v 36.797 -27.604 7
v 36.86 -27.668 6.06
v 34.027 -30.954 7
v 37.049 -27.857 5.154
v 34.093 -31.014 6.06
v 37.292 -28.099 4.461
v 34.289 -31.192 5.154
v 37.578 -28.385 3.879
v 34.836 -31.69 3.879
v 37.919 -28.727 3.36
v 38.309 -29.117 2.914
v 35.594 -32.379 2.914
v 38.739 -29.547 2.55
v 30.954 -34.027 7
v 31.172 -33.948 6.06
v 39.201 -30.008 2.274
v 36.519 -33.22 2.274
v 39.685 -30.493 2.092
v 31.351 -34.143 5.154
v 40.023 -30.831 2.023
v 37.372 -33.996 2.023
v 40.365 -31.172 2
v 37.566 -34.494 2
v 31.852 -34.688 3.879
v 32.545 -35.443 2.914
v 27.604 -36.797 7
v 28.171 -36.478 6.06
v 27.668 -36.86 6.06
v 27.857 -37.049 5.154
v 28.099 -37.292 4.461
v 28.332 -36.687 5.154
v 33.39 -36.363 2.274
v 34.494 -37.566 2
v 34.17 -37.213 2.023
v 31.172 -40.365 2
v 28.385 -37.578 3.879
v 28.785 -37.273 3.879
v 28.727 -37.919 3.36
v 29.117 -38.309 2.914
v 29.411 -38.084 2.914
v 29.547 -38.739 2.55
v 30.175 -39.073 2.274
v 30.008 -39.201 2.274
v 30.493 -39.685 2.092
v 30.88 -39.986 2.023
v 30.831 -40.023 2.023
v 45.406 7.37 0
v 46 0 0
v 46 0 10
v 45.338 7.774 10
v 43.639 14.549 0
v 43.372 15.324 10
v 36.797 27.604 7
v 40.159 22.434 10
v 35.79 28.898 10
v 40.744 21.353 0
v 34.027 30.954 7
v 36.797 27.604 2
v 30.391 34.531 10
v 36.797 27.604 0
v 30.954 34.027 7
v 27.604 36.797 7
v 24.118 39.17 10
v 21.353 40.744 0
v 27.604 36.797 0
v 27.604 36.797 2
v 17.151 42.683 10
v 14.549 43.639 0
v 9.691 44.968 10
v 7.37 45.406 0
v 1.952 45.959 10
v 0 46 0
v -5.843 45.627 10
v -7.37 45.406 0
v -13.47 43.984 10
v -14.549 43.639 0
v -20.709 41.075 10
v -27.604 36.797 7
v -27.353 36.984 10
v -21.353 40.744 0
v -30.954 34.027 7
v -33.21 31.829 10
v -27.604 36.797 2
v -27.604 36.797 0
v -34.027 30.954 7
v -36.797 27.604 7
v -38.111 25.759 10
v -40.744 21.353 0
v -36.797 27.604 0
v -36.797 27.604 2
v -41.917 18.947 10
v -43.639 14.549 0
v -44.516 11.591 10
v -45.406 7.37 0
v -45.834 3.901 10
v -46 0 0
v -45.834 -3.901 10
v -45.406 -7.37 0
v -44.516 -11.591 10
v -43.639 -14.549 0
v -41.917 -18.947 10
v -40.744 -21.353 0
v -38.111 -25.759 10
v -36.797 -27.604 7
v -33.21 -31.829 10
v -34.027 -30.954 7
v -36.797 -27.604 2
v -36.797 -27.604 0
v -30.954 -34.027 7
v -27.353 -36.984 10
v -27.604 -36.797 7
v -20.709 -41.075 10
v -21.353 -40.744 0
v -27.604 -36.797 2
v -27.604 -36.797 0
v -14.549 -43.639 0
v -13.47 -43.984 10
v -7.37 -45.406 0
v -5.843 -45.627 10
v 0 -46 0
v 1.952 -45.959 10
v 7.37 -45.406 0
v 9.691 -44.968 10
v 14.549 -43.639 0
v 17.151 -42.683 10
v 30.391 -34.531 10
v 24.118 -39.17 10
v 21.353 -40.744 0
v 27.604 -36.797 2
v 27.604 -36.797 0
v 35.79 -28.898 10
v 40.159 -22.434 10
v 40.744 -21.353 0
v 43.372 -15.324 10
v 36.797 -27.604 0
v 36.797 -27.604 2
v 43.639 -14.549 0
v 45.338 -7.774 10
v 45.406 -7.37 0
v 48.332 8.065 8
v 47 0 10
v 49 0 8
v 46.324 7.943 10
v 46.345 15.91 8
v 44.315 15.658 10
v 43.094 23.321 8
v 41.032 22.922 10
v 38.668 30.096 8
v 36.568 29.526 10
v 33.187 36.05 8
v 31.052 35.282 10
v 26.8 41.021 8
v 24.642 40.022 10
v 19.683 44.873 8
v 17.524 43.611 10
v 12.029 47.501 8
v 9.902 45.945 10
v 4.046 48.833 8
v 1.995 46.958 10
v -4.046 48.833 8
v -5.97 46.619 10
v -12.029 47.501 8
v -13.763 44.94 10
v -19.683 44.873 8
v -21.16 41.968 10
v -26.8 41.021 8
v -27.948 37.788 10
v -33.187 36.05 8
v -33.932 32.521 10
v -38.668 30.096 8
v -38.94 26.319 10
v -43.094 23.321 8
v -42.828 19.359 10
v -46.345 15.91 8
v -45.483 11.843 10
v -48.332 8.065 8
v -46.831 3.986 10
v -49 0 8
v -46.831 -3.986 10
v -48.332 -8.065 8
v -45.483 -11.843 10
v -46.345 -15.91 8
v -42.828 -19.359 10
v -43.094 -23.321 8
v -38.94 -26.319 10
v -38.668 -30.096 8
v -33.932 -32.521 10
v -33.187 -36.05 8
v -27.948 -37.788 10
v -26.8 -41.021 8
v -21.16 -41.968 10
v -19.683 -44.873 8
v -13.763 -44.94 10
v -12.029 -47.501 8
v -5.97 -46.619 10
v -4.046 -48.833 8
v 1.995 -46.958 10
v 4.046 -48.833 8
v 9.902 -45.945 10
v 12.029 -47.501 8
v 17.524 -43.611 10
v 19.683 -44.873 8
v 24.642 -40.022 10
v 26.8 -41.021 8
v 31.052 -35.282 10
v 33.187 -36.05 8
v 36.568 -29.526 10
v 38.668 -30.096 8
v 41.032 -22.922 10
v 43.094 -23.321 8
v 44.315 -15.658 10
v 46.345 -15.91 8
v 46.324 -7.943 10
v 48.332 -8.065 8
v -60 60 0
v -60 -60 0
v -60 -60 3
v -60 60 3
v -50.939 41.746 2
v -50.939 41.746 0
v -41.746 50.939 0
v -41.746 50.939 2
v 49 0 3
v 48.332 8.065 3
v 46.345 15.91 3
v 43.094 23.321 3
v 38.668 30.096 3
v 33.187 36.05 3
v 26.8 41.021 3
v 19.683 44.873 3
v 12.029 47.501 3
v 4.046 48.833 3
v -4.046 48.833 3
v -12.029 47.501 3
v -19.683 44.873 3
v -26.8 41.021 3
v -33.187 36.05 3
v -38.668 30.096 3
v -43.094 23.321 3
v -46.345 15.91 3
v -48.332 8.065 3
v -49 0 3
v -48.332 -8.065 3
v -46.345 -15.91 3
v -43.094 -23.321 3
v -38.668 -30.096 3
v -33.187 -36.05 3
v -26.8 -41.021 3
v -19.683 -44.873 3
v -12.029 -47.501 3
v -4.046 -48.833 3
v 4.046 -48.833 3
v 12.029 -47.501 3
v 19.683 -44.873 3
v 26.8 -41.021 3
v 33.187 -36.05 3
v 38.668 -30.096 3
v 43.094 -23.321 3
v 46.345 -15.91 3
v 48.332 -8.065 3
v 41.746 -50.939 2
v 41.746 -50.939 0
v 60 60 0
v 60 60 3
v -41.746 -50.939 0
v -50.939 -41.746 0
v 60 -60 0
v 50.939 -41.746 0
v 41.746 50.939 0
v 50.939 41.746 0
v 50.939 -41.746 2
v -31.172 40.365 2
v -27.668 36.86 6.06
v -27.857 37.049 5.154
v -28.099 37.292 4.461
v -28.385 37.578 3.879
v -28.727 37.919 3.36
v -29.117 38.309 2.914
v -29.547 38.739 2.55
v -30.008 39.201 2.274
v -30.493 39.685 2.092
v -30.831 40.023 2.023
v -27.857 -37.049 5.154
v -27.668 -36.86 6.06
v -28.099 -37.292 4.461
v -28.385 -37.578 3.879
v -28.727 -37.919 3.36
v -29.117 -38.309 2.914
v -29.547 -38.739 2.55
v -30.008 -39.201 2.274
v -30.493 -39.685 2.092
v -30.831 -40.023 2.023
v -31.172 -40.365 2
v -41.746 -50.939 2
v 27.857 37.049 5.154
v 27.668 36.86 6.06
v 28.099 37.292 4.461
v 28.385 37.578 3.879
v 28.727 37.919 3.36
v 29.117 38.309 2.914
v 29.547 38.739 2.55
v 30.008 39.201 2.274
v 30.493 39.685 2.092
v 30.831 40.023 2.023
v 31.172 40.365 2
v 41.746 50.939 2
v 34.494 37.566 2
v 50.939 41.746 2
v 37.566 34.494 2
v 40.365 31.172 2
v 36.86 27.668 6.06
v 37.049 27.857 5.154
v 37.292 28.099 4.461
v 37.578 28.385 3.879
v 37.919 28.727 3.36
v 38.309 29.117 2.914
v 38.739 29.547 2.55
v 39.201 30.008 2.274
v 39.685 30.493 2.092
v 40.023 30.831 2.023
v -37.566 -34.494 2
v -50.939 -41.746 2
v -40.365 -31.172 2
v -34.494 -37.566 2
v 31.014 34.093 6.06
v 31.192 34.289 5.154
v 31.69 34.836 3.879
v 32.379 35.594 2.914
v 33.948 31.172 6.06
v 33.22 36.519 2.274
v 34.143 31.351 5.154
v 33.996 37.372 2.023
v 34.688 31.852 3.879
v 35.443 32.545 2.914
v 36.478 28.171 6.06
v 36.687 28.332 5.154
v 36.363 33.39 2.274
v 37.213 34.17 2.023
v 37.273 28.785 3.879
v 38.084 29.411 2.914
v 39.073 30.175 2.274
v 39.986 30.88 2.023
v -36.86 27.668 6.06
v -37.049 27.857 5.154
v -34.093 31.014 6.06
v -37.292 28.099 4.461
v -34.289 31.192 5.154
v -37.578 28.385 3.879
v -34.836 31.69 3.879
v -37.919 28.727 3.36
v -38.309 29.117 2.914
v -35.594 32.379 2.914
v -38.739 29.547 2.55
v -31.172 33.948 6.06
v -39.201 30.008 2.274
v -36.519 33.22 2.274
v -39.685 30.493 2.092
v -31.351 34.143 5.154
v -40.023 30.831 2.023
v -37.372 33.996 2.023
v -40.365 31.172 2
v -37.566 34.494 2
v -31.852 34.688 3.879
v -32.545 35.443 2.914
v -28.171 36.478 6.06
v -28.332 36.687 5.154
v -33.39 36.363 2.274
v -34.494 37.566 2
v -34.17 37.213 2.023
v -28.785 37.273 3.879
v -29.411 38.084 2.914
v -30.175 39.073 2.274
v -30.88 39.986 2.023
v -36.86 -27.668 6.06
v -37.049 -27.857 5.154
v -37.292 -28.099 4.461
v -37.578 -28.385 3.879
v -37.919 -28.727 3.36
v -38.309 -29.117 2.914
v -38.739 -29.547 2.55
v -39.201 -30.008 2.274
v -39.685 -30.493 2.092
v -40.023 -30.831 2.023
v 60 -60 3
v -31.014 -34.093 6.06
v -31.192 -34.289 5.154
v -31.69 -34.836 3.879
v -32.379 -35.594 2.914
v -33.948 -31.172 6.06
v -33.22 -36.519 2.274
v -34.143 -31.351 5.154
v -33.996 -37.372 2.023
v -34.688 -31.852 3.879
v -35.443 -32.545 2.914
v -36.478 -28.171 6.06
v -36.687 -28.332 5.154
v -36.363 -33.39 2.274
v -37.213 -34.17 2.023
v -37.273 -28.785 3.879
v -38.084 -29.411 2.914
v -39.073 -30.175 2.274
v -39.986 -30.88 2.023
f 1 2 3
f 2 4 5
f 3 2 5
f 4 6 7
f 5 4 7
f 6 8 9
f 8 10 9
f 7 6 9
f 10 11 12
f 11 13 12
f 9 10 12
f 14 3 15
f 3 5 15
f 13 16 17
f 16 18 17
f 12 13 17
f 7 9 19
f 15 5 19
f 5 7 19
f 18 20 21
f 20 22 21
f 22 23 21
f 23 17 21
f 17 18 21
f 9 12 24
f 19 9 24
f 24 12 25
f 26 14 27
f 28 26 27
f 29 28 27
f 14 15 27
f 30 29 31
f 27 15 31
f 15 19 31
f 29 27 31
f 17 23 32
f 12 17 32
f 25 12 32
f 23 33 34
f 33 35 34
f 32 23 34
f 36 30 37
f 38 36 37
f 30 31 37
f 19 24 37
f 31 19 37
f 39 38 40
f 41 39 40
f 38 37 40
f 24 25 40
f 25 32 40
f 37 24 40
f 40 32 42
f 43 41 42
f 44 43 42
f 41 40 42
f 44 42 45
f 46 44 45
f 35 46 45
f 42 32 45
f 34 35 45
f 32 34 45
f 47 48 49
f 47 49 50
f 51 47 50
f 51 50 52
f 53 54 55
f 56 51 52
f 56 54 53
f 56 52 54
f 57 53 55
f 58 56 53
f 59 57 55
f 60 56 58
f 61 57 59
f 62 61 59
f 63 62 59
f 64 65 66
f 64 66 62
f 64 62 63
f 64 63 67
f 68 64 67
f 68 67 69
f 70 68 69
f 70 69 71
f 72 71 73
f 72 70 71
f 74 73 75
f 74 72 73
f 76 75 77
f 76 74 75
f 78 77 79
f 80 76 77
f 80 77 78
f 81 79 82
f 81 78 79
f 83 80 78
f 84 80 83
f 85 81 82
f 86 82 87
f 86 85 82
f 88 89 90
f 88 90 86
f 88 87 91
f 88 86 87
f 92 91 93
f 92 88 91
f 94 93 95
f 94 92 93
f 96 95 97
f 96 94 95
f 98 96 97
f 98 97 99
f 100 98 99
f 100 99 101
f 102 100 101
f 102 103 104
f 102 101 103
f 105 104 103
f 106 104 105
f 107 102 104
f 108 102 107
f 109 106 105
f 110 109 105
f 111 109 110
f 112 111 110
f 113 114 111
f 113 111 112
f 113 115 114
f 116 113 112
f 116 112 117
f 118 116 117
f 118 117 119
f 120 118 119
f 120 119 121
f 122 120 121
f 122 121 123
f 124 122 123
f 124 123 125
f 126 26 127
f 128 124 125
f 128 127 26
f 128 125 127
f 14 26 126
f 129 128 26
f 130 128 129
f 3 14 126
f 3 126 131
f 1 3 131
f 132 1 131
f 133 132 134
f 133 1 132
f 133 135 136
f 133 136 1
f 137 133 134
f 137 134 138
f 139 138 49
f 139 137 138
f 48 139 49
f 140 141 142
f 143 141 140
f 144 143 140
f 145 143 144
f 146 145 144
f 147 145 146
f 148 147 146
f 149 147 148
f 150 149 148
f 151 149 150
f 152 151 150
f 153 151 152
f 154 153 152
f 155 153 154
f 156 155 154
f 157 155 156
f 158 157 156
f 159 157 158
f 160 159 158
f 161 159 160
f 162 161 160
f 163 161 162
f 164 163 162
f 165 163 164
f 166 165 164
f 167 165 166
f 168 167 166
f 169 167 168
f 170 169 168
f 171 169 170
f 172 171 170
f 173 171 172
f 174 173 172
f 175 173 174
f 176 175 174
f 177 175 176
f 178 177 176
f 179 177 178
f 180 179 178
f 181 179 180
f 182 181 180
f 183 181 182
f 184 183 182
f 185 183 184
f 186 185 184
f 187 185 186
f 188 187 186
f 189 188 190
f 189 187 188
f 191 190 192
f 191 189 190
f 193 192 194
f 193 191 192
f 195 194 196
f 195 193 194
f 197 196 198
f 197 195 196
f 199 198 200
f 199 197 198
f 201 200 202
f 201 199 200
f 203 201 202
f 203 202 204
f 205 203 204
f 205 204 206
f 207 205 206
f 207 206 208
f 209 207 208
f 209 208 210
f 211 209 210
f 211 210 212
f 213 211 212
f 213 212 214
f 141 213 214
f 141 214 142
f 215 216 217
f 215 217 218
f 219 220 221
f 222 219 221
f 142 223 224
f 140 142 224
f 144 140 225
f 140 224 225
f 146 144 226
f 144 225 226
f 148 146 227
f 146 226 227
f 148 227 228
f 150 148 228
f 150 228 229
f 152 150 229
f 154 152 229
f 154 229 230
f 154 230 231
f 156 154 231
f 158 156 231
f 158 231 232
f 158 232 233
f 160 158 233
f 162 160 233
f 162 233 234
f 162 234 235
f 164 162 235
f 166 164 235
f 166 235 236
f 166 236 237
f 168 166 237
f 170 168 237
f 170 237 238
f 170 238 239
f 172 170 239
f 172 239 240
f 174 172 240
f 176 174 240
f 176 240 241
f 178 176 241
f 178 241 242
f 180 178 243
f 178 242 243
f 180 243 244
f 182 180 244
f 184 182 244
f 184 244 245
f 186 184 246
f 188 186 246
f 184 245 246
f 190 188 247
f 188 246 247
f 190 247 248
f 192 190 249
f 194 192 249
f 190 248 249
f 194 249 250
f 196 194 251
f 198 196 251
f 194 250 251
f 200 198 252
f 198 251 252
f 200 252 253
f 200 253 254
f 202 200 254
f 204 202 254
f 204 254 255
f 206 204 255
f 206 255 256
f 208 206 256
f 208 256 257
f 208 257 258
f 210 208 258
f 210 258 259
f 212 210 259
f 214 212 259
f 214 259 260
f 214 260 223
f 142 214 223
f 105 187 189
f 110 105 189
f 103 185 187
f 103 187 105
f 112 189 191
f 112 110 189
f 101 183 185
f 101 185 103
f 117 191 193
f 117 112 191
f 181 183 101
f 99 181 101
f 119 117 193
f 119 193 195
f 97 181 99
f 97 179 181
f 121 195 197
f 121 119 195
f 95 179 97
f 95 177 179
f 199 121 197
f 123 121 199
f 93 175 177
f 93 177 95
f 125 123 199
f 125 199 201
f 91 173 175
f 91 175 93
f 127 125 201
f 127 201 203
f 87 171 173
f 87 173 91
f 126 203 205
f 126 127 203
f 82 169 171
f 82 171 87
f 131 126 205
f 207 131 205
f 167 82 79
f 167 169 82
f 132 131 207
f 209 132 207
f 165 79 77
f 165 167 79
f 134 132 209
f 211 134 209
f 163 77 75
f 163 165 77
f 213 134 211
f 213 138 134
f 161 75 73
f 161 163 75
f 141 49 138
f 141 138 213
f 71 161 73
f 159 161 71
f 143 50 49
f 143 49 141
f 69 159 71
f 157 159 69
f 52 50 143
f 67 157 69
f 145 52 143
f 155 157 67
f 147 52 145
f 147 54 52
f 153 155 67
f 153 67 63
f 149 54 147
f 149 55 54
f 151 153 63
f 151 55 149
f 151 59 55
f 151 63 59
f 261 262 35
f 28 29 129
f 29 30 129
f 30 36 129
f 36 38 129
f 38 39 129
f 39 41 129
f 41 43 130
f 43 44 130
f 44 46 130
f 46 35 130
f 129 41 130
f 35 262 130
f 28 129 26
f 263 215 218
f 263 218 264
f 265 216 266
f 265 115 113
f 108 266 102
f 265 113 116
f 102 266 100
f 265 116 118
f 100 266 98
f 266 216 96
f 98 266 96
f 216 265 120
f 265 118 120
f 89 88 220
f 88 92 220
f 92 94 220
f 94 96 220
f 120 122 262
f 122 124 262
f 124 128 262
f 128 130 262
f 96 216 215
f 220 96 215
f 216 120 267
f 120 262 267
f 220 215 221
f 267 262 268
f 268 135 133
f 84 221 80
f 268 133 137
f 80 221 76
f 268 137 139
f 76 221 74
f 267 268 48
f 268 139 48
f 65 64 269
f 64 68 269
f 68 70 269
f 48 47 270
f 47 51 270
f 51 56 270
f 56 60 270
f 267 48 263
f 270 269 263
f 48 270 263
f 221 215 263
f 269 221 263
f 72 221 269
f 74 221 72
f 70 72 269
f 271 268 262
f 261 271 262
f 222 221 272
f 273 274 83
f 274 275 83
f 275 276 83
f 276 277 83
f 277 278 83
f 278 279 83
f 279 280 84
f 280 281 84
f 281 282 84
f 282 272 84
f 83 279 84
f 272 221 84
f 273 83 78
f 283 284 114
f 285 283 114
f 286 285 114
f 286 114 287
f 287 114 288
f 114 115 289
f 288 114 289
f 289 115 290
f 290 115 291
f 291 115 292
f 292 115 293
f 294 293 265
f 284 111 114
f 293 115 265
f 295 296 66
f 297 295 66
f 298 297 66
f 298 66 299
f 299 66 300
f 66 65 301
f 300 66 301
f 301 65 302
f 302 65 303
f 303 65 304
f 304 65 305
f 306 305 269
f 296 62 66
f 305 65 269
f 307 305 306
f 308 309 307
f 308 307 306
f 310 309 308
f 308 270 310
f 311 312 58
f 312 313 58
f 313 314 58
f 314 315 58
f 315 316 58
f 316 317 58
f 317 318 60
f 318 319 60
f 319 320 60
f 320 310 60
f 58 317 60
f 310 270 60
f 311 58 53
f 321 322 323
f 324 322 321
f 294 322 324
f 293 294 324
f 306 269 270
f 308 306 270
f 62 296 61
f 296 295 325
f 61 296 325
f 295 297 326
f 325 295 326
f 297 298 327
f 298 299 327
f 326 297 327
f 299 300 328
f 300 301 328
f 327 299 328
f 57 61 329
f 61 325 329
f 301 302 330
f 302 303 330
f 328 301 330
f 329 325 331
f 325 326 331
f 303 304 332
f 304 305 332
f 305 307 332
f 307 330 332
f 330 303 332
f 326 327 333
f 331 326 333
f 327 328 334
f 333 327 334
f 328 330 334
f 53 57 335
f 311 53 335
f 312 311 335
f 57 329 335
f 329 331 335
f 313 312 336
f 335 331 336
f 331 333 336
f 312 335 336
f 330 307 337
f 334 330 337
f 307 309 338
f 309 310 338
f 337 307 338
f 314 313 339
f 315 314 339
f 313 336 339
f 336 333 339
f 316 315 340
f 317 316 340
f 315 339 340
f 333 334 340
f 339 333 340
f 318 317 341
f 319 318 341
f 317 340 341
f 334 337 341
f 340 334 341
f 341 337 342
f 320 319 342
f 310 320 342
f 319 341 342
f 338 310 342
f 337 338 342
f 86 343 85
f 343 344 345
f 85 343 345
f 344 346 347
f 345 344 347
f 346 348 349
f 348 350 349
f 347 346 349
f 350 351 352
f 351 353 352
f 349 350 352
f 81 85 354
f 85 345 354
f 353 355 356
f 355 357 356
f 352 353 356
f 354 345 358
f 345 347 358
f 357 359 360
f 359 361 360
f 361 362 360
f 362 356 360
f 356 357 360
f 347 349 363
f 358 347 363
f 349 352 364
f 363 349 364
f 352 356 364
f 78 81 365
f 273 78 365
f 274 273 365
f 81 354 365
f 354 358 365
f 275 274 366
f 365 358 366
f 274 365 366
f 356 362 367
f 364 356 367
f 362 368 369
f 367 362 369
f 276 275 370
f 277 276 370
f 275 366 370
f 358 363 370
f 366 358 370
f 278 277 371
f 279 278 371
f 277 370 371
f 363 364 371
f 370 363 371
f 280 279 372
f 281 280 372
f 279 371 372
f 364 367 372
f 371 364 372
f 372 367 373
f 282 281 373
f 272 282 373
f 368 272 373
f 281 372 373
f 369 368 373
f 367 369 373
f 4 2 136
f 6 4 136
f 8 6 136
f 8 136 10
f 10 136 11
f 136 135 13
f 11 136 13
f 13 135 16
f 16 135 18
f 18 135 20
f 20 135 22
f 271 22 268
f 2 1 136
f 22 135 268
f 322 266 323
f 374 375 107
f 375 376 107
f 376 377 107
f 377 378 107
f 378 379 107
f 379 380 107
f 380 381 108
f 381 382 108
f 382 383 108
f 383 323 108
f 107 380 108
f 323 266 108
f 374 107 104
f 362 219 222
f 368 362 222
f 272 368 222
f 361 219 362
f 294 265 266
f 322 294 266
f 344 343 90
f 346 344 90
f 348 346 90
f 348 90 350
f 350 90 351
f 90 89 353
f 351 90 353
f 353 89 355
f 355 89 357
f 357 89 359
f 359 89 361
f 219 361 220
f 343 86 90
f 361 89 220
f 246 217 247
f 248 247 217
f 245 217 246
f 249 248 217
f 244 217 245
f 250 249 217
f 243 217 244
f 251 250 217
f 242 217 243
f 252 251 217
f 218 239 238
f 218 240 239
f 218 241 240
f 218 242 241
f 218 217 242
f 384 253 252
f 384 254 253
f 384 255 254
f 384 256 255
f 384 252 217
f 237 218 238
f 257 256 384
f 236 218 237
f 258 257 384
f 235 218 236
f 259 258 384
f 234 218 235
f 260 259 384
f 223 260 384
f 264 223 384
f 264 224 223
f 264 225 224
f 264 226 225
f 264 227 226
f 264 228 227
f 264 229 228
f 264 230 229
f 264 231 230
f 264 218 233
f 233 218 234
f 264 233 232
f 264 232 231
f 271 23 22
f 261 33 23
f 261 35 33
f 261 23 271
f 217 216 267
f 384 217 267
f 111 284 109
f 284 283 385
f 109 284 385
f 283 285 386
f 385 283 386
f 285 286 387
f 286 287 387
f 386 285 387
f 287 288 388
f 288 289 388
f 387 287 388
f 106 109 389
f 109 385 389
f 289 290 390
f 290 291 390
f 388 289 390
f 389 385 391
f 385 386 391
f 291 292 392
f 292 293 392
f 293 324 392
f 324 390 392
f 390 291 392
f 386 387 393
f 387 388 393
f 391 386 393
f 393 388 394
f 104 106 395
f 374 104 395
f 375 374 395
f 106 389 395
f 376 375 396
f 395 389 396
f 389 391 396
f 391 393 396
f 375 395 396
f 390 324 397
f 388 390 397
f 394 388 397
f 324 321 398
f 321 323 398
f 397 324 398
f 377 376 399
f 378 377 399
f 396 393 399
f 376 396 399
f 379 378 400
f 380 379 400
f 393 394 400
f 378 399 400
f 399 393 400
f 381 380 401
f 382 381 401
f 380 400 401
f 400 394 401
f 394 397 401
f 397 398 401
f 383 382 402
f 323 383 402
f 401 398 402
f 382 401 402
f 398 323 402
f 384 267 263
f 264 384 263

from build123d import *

# Parameters (mm, degrees)
F0_R     = 49
F0_R_2   = 46
F1_DEPTH = 10
F0_W     = 120
F0_H     = 120
F2_DEPTH = 3
F3_SIZE  = 2
F5_DEPTH = 2
F6_R     = 5


with BuildPart() as f1:
    # F0 (on Top) → F1 (new body)
    with BuildSketch(Plane.XY):
        Circle(F0_R)
        Circle(F0_R_2, mode=Mode.SUBTRACT)
    extrude(amount=F1_DEPTH)

    # F0 (on Top) → F2 (join)
    with BuildSketch(Plane.XY):
        Rectangle(F0_W, F0_H)
        Circle(F0_R, mode=Mode.SUBTRACT)
    extrude(amount=F2_DEPTH)

    # F3
    f3_edges = [f1.edges().sort_by_distance(p)[0] for p in [
        (-49, 0, 10),
    ]]
    chamfer(f3_edges, length=F3_SIZE)

    # F4 (on face) → F5 (cut)
    with BuildSketch(Plane(origin=(0, 0, 0), x_dir=(1, 0, 0), z_dir=(0, 0, -1))):
        Polygon((-27.604349, 36.796738), (-41.746485, 50.938873), (-50.938873, 41.746485), (-36.796738, 27.604349), align=None)
        Polygon((41.746485, -50.938873), (50.938873, -41.746485), (36.796738, -27.604349), (27.604349, -36.796738), align=None)
        Polygon((50.938873, 41.746485), (41.746485, 50.938873), (27.604349, 36.796738), (36.796738, 27.604349), align=None)
        Polygon((-36.796738, -27.604349), (-50.938873, -41.746485), (-41.746485, -50.938873), (-27.604349, -36.796738), align=None)
    extrude(amount=-F5_DEPTH, mode=Mode.SUBTRACT)

    # F6
    f6_edges = [f1.edges().sort_by_distance(p)[0] for p in [
        (-32.526912, -32.526912, 2),
        (32.526912, -32.526912, 2),
        (32.526912, 32.526912, 2),
        (-32.526912, 32.526912, 2),
    ]]
    fillet(f6_edges, radius=F6_R)


solid = f1.part
